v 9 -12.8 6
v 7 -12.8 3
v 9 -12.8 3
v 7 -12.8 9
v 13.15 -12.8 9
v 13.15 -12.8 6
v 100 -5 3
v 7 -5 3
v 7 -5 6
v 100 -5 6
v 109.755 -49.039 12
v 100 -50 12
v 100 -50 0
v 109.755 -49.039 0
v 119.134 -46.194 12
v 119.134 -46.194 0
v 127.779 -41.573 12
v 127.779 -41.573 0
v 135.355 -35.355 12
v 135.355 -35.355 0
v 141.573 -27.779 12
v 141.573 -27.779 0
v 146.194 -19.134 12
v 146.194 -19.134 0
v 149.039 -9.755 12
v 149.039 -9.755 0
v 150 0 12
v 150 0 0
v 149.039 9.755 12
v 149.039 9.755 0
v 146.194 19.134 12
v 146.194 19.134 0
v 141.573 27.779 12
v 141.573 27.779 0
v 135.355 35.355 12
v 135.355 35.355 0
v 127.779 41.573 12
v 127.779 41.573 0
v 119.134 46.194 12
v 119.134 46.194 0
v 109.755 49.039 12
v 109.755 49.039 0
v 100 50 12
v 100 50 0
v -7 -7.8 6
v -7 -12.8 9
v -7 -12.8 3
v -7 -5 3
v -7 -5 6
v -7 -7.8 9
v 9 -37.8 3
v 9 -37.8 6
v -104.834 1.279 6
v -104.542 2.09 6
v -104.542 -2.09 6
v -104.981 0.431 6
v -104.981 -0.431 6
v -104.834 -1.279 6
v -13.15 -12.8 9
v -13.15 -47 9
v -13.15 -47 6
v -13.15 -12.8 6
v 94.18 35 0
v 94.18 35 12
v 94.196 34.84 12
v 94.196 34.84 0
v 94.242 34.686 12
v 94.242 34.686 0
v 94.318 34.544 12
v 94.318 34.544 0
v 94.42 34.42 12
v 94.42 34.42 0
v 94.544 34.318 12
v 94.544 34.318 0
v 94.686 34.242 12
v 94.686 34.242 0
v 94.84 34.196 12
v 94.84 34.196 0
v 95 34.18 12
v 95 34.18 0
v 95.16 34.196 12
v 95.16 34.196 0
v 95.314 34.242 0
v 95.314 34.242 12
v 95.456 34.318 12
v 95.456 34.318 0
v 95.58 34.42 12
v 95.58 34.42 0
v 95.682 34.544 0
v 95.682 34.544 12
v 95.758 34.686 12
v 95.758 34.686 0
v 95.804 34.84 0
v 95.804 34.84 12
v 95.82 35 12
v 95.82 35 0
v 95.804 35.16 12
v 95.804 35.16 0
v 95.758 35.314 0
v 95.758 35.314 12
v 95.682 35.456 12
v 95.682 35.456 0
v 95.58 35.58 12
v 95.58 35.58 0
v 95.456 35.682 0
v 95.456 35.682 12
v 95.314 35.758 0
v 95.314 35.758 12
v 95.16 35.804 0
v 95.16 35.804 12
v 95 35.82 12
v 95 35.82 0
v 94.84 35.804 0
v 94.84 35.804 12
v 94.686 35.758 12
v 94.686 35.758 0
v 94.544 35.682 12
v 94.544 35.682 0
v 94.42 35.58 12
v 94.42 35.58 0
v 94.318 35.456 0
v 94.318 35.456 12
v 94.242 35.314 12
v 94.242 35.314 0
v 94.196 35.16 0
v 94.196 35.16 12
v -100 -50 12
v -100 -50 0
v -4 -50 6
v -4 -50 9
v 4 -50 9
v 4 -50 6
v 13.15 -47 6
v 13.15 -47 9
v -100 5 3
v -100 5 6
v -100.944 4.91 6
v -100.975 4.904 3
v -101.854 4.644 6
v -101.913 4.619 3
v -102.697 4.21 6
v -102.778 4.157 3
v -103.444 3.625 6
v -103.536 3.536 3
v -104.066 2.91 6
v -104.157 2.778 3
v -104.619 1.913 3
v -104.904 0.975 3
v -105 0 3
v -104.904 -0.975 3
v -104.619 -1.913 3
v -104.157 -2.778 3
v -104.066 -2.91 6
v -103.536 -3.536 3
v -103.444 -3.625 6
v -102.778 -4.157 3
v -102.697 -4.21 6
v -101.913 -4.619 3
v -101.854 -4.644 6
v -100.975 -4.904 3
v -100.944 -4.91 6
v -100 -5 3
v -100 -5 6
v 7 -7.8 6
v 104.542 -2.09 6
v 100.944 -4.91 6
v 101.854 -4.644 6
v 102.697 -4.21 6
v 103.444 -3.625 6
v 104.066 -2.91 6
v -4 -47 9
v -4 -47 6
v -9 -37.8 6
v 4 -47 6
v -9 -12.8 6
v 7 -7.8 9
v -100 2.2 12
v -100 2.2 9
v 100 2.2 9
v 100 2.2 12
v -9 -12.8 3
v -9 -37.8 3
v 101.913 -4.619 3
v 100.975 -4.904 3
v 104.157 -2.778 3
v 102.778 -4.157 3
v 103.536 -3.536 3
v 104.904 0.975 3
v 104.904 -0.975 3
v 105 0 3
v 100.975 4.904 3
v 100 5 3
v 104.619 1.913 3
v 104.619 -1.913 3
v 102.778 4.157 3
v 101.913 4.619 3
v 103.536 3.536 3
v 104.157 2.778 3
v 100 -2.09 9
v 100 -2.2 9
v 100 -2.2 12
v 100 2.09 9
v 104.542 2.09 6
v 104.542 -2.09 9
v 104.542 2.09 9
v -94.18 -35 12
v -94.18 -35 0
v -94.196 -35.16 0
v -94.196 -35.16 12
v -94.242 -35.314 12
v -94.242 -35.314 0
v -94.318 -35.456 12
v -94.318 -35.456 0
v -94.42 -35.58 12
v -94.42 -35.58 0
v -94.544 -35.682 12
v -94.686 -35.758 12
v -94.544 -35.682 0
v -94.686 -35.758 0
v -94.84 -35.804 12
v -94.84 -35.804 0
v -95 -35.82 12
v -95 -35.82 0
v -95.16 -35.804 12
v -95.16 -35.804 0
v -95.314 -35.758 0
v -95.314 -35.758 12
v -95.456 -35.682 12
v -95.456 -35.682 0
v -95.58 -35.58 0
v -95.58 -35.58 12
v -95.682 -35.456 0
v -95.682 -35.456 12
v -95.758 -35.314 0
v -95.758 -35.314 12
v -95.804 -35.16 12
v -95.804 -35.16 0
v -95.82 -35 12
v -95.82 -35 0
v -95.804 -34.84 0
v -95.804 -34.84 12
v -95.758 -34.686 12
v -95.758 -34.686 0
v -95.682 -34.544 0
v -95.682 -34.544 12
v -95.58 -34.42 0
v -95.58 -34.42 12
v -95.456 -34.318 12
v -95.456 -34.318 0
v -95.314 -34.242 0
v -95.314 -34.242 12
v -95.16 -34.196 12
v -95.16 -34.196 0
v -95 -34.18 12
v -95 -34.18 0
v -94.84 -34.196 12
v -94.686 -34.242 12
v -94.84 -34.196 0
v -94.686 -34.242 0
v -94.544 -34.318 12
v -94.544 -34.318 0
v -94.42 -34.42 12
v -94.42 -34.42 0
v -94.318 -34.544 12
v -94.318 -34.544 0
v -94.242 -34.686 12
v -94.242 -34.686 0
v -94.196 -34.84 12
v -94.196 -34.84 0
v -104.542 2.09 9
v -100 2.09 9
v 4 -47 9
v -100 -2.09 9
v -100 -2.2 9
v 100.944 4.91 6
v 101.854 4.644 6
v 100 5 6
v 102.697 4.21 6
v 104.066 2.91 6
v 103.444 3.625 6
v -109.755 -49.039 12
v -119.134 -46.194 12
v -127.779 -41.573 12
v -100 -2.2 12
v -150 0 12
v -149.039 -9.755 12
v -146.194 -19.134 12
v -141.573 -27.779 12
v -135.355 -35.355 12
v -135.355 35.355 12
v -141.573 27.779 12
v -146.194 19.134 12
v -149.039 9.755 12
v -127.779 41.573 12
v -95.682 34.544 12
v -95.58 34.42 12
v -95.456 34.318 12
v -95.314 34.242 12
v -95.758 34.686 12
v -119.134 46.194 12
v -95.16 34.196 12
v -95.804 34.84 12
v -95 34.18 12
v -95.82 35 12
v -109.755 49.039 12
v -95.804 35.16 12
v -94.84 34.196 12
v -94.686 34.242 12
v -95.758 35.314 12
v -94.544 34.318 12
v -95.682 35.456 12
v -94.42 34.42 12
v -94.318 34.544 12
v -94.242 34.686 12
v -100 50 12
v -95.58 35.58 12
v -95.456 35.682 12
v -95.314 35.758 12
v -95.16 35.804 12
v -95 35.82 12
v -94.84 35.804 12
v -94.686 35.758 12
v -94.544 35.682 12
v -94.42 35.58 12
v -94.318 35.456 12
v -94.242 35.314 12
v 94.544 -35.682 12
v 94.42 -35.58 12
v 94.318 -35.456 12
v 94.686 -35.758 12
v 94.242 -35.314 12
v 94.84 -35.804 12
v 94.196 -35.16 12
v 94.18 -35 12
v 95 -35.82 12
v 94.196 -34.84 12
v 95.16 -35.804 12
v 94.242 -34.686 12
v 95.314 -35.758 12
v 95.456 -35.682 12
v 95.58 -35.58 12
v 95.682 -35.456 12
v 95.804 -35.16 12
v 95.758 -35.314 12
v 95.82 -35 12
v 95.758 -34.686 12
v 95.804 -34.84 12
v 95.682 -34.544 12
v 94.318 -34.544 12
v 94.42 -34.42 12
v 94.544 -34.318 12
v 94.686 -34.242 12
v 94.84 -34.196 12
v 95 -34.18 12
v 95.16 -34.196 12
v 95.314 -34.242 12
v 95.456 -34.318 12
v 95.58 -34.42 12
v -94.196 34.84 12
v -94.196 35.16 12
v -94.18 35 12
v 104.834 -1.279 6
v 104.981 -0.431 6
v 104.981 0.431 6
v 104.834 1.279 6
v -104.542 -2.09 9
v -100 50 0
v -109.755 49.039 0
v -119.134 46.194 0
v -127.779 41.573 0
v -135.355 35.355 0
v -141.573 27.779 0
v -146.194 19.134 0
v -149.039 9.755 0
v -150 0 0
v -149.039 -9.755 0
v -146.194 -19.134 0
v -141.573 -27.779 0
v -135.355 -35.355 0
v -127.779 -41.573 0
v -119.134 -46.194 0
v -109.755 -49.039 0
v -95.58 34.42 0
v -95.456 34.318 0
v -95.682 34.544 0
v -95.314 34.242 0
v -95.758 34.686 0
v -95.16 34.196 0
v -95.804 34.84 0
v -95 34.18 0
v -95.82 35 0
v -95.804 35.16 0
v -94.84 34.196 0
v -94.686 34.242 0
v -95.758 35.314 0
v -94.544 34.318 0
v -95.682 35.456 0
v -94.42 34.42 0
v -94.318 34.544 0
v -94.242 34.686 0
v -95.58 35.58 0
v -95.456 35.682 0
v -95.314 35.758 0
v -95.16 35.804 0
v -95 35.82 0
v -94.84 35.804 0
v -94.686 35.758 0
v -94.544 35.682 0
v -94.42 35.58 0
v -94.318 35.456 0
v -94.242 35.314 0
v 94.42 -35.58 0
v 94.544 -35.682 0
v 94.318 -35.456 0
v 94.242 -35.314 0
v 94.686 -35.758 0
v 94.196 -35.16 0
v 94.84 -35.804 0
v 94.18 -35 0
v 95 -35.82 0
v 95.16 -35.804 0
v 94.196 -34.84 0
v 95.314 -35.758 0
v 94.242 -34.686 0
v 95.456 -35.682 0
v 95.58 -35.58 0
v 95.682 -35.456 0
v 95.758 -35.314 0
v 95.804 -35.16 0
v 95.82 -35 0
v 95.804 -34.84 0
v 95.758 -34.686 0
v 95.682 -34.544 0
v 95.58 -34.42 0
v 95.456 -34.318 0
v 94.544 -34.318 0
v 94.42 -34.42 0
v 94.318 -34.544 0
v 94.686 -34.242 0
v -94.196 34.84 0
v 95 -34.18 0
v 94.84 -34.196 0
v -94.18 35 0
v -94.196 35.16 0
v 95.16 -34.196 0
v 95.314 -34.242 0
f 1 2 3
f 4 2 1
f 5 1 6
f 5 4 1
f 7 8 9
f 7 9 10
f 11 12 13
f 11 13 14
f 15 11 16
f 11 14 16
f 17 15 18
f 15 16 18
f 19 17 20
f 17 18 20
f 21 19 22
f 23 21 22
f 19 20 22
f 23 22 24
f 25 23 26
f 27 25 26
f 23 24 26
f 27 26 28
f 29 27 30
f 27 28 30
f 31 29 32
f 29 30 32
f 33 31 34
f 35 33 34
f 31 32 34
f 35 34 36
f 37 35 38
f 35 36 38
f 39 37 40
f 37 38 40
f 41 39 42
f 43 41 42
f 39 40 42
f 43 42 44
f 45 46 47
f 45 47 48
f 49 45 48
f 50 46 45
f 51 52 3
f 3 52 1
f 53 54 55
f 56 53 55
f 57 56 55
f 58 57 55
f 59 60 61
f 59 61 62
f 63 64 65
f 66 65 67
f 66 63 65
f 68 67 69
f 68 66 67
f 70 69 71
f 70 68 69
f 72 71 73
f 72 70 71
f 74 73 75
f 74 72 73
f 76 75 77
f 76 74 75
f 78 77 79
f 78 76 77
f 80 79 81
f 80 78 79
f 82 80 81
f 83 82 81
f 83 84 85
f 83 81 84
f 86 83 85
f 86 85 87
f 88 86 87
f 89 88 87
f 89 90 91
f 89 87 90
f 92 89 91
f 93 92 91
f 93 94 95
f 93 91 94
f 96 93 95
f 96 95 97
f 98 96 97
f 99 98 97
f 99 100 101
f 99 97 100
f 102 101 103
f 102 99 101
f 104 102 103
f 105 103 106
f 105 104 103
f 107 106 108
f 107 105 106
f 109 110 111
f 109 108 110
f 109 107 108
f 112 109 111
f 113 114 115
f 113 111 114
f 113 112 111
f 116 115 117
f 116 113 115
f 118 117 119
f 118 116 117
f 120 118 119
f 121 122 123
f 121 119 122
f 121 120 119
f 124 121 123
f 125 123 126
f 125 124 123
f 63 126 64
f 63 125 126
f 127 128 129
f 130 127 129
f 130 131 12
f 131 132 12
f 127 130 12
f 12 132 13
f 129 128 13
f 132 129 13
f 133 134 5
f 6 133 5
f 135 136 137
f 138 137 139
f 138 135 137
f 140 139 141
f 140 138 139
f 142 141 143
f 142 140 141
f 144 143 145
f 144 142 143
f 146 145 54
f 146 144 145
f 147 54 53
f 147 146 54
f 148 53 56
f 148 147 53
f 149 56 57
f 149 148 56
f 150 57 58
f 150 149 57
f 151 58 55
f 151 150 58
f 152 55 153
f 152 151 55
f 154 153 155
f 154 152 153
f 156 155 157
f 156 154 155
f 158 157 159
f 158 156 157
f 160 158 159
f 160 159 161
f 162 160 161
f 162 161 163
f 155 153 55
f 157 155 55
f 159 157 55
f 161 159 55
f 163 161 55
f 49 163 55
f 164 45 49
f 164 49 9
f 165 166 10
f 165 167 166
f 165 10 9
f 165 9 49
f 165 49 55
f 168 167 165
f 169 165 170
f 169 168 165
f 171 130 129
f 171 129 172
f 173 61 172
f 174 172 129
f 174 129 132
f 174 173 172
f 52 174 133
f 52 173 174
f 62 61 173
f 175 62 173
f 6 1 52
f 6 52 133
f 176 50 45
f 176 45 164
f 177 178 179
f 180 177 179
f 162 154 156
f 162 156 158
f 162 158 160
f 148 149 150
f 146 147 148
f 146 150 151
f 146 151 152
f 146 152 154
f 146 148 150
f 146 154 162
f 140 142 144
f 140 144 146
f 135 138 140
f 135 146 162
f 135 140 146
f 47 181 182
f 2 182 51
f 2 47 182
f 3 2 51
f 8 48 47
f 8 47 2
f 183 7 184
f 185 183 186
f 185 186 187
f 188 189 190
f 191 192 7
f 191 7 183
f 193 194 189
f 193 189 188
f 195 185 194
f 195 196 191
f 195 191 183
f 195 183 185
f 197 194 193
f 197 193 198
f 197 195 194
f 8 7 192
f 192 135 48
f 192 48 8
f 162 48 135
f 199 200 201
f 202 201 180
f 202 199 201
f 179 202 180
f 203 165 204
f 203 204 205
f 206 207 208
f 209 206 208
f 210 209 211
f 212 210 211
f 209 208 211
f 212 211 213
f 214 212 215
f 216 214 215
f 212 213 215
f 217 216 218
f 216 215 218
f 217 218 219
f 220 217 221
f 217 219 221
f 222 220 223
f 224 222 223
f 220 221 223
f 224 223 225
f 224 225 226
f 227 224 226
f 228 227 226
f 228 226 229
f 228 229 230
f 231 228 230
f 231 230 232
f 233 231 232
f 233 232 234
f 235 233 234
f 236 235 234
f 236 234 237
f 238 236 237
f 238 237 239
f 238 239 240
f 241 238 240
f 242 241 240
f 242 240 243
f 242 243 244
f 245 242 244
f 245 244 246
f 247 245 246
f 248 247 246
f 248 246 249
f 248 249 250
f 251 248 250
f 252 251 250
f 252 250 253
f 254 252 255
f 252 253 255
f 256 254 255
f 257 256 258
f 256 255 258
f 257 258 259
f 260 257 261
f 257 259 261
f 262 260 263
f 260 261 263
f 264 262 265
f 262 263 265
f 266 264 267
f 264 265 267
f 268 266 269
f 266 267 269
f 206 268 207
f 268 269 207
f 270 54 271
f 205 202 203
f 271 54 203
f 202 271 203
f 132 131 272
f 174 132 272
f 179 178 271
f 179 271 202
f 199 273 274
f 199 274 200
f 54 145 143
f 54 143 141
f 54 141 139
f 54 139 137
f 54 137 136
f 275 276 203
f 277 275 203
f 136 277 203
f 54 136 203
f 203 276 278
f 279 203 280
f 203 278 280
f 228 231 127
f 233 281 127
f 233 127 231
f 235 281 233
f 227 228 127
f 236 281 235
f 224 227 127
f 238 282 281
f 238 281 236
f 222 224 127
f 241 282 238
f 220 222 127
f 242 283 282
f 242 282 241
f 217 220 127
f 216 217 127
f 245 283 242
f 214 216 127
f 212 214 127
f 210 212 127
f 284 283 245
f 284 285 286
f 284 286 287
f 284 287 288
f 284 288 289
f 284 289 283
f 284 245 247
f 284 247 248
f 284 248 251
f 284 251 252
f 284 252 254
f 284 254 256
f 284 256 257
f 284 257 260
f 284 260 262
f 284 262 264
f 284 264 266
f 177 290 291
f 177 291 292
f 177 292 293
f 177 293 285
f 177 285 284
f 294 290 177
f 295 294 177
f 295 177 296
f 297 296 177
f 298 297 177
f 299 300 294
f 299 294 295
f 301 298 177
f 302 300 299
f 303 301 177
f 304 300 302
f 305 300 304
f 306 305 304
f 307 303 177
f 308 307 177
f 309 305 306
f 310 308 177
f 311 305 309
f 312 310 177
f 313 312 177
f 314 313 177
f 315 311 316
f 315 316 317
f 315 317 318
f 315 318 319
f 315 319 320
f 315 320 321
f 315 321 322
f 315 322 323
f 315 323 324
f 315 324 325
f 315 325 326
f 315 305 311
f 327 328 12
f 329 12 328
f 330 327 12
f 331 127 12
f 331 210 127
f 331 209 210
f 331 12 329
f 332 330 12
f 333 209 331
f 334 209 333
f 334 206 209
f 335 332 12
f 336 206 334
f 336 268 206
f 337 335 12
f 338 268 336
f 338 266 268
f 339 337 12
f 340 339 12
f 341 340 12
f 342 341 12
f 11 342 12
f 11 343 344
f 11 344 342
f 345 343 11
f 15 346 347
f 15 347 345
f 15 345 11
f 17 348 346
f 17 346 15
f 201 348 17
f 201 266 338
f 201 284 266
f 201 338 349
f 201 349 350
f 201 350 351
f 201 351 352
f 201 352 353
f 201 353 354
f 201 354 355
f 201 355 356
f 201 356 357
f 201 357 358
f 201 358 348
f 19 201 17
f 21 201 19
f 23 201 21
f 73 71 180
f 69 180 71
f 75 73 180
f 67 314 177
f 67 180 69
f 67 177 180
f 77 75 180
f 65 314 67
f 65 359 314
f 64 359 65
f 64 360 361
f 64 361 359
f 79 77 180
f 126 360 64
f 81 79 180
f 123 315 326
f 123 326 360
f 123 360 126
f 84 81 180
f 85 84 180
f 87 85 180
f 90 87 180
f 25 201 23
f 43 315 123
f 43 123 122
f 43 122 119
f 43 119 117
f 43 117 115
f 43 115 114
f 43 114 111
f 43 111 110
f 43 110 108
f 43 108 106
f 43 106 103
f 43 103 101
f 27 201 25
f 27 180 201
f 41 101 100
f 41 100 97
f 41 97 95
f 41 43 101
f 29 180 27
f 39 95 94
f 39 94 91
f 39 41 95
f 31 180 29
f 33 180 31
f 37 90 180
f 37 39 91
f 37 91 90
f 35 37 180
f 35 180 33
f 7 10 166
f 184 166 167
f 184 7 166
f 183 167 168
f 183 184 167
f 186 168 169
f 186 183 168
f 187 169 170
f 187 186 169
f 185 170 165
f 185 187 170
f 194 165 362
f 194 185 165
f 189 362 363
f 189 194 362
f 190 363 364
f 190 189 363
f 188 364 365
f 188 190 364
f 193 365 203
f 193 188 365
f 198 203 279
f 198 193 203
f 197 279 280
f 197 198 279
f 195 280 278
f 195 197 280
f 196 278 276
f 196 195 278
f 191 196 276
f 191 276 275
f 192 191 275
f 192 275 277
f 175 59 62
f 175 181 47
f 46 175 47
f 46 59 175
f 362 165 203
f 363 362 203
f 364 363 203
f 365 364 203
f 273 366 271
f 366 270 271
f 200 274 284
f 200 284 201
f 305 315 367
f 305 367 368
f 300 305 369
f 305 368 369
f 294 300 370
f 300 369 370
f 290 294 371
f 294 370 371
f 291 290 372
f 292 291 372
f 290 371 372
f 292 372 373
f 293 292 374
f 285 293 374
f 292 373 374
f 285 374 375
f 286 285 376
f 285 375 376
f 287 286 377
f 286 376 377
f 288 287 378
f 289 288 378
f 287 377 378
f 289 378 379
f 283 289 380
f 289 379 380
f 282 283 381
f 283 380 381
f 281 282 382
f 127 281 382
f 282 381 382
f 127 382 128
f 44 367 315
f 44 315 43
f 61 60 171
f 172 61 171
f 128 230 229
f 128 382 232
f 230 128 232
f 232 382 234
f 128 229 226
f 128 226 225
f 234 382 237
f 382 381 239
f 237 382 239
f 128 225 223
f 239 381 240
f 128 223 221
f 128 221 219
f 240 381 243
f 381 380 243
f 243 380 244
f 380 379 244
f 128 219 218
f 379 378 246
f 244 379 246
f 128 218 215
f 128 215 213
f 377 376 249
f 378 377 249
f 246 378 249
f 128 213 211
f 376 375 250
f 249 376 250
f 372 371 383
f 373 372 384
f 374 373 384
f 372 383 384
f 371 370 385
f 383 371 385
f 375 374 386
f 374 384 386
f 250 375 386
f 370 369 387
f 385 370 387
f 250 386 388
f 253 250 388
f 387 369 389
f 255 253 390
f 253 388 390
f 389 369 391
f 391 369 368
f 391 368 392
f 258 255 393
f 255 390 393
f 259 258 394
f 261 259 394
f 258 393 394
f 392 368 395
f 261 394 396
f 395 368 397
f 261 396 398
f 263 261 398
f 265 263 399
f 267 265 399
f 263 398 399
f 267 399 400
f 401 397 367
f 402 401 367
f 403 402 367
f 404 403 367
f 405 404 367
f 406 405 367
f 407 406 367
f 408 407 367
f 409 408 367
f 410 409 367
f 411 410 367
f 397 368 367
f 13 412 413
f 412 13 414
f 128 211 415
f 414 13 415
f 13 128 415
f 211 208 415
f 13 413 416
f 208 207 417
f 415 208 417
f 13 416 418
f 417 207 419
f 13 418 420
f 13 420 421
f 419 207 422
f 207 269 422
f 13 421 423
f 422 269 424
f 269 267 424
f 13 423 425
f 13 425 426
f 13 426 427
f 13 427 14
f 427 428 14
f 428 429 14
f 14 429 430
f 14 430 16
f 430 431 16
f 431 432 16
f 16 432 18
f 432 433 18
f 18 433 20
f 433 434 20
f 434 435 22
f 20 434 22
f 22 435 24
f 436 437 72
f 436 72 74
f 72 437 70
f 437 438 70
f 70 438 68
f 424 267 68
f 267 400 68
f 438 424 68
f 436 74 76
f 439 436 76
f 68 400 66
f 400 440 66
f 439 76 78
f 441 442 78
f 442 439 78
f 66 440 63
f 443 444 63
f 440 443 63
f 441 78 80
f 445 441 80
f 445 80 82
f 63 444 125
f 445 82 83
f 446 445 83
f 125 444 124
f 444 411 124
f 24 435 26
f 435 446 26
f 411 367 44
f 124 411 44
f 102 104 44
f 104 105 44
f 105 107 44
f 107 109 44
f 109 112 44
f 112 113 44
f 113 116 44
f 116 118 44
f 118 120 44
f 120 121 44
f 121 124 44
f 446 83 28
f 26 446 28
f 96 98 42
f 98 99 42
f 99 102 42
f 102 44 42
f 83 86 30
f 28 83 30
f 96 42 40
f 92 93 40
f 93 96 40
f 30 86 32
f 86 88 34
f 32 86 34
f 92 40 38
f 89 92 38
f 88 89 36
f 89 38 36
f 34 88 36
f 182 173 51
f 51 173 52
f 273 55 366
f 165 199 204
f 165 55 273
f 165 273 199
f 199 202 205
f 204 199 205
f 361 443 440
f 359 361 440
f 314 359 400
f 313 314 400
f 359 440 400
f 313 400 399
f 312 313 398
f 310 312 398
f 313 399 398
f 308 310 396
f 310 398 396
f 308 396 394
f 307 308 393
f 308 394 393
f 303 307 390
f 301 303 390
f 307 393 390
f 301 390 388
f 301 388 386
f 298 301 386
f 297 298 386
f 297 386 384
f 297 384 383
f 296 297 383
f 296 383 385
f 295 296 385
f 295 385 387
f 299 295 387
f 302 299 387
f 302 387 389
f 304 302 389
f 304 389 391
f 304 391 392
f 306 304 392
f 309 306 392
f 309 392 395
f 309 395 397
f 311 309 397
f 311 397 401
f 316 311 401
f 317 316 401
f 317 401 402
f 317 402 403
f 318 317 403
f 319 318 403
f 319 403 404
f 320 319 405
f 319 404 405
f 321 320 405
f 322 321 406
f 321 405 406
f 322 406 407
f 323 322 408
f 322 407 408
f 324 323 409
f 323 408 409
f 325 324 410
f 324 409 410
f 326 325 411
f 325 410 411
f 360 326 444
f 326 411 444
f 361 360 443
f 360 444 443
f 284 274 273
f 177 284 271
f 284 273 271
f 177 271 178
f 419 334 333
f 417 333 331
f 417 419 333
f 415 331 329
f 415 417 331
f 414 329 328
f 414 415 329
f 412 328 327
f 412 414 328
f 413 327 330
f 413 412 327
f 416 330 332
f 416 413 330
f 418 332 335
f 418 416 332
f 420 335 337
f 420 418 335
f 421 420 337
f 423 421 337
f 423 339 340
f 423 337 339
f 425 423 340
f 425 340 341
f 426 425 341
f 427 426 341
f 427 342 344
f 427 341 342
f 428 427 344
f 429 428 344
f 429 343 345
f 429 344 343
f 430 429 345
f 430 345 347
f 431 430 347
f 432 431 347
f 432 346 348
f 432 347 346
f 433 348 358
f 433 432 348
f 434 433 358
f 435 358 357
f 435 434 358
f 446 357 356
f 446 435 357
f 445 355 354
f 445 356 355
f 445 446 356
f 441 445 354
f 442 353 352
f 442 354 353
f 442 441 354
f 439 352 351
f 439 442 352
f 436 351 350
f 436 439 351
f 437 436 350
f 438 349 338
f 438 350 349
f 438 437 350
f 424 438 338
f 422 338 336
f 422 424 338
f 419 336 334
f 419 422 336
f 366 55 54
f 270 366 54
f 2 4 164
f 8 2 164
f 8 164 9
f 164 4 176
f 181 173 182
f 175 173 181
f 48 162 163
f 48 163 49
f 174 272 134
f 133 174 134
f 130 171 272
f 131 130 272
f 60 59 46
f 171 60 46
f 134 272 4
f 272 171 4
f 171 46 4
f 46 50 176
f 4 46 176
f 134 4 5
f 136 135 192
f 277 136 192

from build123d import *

# Parameters (mm, degrees)
PAD_DEPTH       = 3
PAD001_DEPTH    = 3
SKETCH002_W     = 209.08447
SKETCH002_H     = 4.18
PAD002_DEPTH    = 3
SKETCH003_W     = 26.3
SKETCH003_H     = 34.2
POCKET_DEPTH    = 3
SKETCH004_W     = 18
SKETCH004_H     = 25
POCKET001_DEPTH = 3
SKETCH005_W     = 14
SKETCH005_H     = 5
POCKET002_DEPTH = 6
SKETCH006_W     = 14
SKETCH006_H     = 3
POCKET003_DEPTH = 3
SKETCH007_W     = 8
SKETCH007_H     = 3
POCKET004_DEPTH = 3
SKETCH008_W     = 200
SKETCH008_H     = 4.4
PAD003_DEPTH    = 3
SKETCH009_R     = 0.82
POCKET005_DEPTH = 644.911736


with BuildPart() as part:
    # Sketch → Pad (new body)
    with BuildSketch(Plane.XY):
        with BuildLine():
            ThreePointArc((-100, 50), (-150, 0), (-100, -50))
            Line((-100, -50), (100, -50))
            ThreePointArc((100, -50), (150, 0), (100, 50))
            Line((-100, 50), (100, 50))
        make_face()
    extrude(amount=PAD_DEPTH)

    # Sketch001 (on Face6 of Pad) → Pad001 (join)
    with BuildSketch(Plane.XY.offset(3)):
        with BuildLine():
            ThreePointArc((-100, 50), (-150, 0), (-100, -50))
            Line((-100, -50), (100, -50))
            ThreePointArc((100, -50), (150, 0), (100, 50))
            Line((-100, 50), (100, 50))
        make_face()
        with BuildLine():
            ThreePointArc((-100, 5), (-105, 0), (-100, -5))
            Line((-100, -5), (100, -5))
            ThreePointArc((100, -5), (105, 0), (100, 5))
            Line((-100, 5), (100, 5))
        make_face(mode=Mode.SUBTRACT)
    extrude(amount=PAD001_DEPTH)

    # Sketch002 (on Face9 of Pad001) → Pad002 (join)
    with BuildSketch(Plane.XY.offset(6)):
        with BuildLine():
            ThreePointArc((-100, 50), (-150, 0), (-100, -50))
            Line((-100, -50), (100, -50))
            ThreePointArc((100, -50), (150, 0), (100, 50))
            Line((-100, 50), (100, 50))
        make_face()
        Rectangle(SKETCH002_W, SKETCH002_H, mode=Mode.SUBTRACT)
    extrude(amount=PAD002_DEPTH)

    # Sketch003 (on Face13 of Pad002) → Pocket (cut)
    with BuildSketch(Plane.XY.offset(9)):
        with Locations((0, -29.9)):
            Rectangle(SKETCH003_W, SKETCH003_H)
    extrude(amount=-POCKET_DEPTH, mode=Mode.SUBTRACT)

    # Sketch004 (on Face27 of Pocket) → Pocket001 (cut)
    with BuildSketch(Plane.XY.offset(6)):
        with Locations((0, -25.3)):
            Rectangle(SKETCH004_W, SKETCH004_H)
    extrude(amount=-POCKET001_DEPTH, mode=Mode.SUBTRACT)

    # Sketch005 (on Face13 of Pocket001) → Pocket002 (cut)
    with BuildSketch(Plane.XY.offset(9)):
        with Locations((0, -10.3)):
            Rectangle(SKETCH005_W, SKETCH005_H)
    extrude(amount=-POCKET002_DEPTH, mode=Mode.SUBTRACT)

    # Sketch006 (on Face23 of Pocket002) → Pocket003 (cut)
    with BuildSketch(Plane.XZ.offset(7.8)):
        with Locations((0, 4.5)):
            Rectangle(SKETCH006_W, SKETCH006_H)
    extrude(amount=-POCKET003_DEPTH, mode=Mode.SUBTRACT)

    # Sketch007 (on Face13 of Pocket003) → Pocket004 (cut)
    with BuildSketch(Plane.XY.offset(9)):
        with Locations((0, -48.5)):
            Rectangle(SKETCH007_W, SKETCH007_H)
    extrude(amount=-POCKET004_DEPTH, mode=Mode.SUBTRACT)

    # Sketch008 (on Face15 of Pocket004) → Pad003 (join)
    with BuildSketch(Plane.XY.offset(9)):
        with BuildLine():
            ThreePointArc((-100, 50), (-150, 0), (-100, -50))
            Line((-100, -50), (100, -50))
            ThreePointArc((100, -50), (150, 0), (100, 50))
            Line((-100, 50), (100, 50))
        make_face()
        Rectangle(SKETCH008_W, SKETCH008_H, mode=Mode.SUBTRACT)
    extrude(amount=PAD003_DEPTH)

    # Sketch009 (on Face4 of Pad003) → Pocket005 (cut, through all)
    with BuildSketch(Plane(origin=(0, 0, 0), x_dir=(1, 0, 0), z_dir=(0, 0, -1))):
        with Locations((-95, 35)):
            Circle(SKETCH009_R)
        with Locations((-95, -35)):
            Circle(SKETCH009_R)
    pocket005 = extrude(amount=-POCKET005_DEPTH, mode=Mode.SUBTRACT)

    # Mirrored: Pocket005 across Sketch009 V_Axis
    add(pocket005.mirror(Plane(origin=(0, 0, 0), x_dir=(0, 0, -1), z_dir=(1, 0, 0))), mode=Mode.SUBTRACT)


solid = part.part
